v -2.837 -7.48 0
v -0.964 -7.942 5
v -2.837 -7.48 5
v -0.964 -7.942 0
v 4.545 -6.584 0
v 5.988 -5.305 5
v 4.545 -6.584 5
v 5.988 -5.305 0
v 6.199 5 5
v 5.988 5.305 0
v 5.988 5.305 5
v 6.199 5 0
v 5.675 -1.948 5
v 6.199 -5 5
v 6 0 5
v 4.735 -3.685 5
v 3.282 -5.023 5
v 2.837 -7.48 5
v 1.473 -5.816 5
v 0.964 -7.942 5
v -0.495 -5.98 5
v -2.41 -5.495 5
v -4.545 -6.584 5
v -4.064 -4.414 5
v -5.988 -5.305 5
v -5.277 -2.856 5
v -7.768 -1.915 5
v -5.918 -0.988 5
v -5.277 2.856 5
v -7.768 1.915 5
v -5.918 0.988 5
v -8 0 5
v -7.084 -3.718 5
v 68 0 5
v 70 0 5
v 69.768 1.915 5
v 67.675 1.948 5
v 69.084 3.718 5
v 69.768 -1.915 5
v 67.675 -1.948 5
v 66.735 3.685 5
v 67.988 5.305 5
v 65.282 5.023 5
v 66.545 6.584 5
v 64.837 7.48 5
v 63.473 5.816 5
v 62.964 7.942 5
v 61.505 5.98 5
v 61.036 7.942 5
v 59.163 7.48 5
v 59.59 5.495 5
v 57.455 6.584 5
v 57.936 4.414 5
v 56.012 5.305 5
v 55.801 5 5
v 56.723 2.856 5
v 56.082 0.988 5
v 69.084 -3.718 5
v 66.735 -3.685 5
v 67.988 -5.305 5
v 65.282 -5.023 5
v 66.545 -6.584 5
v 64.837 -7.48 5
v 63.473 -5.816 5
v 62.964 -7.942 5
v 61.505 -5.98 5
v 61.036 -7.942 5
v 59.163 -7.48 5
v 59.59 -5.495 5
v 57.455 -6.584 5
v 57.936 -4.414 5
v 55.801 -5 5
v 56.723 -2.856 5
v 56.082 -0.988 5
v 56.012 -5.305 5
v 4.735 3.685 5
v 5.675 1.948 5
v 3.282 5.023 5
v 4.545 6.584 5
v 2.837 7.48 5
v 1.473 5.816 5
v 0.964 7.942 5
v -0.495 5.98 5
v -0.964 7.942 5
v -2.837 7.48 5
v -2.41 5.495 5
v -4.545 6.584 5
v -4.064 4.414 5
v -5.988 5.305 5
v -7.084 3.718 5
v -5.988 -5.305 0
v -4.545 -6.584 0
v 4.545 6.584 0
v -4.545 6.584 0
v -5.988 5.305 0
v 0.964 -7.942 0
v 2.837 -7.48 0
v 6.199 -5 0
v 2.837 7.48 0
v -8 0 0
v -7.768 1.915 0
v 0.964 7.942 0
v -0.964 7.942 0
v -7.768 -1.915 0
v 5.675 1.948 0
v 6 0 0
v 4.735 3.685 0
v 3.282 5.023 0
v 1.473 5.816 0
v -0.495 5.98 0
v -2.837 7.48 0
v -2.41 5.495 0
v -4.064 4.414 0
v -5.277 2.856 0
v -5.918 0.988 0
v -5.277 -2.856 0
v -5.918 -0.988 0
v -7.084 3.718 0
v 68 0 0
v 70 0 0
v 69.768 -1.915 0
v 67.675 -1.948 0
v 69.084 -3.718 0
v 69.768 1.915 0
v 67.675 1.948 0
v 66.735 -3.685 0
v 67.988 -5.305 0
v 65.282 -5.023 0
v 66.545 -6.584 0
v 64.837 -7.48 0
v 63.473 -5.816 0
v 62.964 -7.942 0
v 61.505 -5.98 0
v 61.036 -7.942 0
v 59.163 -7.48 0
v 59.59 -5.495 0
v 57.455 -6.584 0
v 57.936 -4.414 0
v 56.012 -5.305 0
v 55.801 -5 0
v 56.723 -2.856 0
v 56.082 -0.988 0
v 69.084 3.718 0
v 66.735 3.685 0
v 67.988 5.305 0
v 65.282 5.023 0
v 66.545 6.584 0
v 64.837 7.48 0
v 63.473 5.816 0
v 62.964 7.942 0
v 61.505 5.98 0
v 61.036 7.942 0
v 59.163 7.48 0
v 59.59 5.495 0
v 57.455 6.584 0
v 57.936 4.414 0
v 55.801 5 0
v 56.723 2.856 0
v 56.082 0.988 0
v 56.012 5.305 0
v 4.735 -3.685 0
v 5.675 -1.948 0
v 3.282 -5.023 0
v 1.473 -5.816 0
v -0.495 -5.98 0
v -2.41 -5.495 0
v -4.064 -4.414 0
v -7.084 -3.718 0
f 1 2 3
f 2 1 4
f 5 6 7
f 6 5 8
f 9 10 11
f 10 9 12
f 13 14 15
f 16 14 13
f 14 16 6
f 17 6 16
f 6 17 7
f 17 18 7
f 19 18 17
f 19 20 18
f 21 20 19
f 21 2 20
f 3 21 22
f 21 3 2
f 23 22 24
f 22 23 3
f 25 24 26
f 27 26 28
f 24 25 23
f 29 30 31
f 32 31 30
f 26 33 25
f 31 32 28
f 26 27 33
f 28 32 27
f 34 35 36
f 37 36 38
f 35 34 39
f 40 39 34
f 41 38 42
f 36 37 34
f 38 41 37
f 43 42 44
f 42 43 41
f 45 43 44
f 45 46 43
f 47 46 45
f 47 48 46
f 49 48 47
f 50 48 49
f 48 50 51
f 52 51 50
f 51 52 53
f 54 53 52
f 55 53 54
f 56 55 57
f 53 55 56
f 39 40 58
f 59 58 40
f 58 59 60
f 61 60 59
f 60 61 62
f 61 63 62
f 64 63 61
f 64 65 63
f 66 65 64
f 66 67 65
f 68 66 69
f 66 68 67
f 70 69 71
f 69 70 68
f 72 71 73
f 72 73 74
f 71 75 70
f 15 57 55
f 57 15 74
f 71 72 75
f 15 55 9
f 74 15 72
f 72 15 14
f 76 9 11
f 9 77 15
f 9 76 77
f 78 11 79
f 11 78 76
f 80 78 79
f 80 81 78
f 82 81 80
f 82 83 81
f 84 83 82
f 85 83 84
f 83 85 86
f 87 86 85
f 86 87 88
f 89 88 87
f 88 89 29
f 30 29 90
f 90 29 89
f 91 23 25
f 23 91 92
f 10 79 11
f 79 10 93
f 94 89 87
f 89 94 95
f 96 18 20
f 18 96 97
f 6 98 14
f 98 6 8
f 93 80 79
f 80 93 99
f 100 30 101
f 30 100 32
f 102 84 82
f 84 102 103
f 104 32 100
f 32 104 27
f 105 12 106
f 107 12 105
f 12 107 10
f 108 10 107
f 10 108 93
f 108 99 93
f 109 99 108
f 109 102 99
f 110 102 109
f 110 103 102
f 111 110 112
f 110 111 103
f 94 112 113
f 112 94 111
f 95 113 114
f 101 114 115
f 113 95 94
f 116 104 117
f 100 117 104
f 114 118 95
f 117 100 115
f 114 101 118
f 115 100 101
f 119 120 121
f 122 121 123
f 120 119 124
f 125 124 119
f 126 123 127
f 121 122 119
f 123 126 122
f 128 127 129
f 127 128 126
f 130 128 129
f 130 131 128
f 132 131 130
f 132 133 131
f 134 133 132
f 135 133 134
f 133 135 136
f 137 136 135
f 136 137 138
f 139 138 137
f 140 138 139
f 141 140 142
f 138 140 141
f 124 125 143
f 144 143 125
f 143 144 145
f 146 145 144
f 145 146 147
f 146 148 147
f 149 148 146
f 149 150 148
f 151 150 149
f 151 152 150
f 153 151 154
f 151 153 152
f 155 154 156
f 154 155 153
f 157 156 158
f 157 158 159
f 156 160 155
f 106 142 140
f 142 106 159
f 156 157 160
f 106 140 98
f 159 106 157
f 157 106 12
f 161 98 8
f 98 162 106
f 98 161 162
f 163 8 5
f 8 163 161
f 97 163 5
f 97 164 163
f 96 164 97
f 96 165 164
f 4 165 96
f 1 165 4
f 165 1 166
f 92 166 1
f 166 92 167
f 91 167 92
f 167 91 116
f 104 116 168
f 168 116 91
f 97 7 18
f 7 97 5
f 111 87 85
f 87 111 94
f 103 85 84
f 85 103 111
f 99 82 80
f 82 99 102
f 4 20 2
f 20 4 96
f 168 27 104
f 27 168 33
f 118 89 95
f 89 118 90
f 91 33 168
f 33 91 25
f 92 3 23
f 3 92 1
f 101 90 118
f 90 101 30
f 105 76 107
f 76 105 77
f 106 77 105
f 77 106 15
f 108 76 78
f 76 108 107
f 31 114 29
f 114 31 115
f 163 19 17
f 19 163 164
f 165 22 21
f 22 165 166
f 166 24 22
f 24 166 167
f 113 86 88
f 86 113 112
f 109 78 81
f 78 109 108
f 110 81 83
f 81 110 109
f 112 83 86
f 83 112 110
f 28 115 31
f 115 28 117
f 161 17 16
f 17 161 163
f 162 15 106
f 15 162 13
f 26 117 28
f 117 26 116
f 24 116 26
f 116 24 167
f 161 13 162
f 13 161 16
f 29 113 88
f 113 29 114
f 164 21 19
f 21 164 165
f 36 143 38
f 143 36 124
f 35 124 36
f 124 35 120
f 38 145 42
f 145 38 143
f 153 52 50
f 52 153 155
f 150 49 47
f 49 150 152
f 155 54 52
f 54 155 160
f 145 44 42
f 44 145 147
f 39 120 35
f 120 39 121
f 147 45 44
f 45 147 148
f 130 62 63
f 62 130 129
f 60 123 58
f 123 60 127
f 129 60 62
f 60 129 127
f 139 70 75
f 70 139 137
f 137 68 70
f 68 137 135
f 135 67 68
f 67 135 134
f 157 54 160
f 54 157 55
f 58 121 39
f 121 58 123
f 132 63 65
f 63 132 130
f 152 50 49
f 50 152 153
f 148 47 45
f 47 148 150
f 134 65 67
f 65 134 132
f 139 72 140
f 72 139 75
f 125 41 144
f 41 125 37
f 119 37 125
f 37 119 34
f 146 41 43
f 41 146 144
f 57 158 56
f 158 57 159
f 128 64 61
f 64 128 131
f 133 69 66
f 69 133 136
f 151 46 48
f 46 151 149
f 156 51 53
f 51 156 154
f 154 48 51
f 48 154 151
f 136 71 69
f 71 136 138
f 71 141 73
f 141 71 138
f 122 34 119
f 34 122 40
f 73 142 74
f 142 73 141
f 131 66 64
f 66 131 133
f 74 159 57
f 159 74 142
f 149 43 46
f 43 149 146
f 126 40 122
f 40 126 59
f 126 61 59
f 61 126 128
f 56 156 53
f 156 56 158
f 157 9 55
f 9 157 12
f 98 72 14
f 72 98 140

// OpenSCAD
length = 50; // min/max:[5:100]

union(){
difference(){
    cylinder(5,8,8);
    translate([0,0,-1]) cylinder(7,6,6);
}
translate([6,-5,0]) cube([length,10,5]);
difference(){
    translate([length+12,0,0]) cylinder(5,8,8);
    translate([length+12,0,-1]) cylinder(7,6,6);
}
}
